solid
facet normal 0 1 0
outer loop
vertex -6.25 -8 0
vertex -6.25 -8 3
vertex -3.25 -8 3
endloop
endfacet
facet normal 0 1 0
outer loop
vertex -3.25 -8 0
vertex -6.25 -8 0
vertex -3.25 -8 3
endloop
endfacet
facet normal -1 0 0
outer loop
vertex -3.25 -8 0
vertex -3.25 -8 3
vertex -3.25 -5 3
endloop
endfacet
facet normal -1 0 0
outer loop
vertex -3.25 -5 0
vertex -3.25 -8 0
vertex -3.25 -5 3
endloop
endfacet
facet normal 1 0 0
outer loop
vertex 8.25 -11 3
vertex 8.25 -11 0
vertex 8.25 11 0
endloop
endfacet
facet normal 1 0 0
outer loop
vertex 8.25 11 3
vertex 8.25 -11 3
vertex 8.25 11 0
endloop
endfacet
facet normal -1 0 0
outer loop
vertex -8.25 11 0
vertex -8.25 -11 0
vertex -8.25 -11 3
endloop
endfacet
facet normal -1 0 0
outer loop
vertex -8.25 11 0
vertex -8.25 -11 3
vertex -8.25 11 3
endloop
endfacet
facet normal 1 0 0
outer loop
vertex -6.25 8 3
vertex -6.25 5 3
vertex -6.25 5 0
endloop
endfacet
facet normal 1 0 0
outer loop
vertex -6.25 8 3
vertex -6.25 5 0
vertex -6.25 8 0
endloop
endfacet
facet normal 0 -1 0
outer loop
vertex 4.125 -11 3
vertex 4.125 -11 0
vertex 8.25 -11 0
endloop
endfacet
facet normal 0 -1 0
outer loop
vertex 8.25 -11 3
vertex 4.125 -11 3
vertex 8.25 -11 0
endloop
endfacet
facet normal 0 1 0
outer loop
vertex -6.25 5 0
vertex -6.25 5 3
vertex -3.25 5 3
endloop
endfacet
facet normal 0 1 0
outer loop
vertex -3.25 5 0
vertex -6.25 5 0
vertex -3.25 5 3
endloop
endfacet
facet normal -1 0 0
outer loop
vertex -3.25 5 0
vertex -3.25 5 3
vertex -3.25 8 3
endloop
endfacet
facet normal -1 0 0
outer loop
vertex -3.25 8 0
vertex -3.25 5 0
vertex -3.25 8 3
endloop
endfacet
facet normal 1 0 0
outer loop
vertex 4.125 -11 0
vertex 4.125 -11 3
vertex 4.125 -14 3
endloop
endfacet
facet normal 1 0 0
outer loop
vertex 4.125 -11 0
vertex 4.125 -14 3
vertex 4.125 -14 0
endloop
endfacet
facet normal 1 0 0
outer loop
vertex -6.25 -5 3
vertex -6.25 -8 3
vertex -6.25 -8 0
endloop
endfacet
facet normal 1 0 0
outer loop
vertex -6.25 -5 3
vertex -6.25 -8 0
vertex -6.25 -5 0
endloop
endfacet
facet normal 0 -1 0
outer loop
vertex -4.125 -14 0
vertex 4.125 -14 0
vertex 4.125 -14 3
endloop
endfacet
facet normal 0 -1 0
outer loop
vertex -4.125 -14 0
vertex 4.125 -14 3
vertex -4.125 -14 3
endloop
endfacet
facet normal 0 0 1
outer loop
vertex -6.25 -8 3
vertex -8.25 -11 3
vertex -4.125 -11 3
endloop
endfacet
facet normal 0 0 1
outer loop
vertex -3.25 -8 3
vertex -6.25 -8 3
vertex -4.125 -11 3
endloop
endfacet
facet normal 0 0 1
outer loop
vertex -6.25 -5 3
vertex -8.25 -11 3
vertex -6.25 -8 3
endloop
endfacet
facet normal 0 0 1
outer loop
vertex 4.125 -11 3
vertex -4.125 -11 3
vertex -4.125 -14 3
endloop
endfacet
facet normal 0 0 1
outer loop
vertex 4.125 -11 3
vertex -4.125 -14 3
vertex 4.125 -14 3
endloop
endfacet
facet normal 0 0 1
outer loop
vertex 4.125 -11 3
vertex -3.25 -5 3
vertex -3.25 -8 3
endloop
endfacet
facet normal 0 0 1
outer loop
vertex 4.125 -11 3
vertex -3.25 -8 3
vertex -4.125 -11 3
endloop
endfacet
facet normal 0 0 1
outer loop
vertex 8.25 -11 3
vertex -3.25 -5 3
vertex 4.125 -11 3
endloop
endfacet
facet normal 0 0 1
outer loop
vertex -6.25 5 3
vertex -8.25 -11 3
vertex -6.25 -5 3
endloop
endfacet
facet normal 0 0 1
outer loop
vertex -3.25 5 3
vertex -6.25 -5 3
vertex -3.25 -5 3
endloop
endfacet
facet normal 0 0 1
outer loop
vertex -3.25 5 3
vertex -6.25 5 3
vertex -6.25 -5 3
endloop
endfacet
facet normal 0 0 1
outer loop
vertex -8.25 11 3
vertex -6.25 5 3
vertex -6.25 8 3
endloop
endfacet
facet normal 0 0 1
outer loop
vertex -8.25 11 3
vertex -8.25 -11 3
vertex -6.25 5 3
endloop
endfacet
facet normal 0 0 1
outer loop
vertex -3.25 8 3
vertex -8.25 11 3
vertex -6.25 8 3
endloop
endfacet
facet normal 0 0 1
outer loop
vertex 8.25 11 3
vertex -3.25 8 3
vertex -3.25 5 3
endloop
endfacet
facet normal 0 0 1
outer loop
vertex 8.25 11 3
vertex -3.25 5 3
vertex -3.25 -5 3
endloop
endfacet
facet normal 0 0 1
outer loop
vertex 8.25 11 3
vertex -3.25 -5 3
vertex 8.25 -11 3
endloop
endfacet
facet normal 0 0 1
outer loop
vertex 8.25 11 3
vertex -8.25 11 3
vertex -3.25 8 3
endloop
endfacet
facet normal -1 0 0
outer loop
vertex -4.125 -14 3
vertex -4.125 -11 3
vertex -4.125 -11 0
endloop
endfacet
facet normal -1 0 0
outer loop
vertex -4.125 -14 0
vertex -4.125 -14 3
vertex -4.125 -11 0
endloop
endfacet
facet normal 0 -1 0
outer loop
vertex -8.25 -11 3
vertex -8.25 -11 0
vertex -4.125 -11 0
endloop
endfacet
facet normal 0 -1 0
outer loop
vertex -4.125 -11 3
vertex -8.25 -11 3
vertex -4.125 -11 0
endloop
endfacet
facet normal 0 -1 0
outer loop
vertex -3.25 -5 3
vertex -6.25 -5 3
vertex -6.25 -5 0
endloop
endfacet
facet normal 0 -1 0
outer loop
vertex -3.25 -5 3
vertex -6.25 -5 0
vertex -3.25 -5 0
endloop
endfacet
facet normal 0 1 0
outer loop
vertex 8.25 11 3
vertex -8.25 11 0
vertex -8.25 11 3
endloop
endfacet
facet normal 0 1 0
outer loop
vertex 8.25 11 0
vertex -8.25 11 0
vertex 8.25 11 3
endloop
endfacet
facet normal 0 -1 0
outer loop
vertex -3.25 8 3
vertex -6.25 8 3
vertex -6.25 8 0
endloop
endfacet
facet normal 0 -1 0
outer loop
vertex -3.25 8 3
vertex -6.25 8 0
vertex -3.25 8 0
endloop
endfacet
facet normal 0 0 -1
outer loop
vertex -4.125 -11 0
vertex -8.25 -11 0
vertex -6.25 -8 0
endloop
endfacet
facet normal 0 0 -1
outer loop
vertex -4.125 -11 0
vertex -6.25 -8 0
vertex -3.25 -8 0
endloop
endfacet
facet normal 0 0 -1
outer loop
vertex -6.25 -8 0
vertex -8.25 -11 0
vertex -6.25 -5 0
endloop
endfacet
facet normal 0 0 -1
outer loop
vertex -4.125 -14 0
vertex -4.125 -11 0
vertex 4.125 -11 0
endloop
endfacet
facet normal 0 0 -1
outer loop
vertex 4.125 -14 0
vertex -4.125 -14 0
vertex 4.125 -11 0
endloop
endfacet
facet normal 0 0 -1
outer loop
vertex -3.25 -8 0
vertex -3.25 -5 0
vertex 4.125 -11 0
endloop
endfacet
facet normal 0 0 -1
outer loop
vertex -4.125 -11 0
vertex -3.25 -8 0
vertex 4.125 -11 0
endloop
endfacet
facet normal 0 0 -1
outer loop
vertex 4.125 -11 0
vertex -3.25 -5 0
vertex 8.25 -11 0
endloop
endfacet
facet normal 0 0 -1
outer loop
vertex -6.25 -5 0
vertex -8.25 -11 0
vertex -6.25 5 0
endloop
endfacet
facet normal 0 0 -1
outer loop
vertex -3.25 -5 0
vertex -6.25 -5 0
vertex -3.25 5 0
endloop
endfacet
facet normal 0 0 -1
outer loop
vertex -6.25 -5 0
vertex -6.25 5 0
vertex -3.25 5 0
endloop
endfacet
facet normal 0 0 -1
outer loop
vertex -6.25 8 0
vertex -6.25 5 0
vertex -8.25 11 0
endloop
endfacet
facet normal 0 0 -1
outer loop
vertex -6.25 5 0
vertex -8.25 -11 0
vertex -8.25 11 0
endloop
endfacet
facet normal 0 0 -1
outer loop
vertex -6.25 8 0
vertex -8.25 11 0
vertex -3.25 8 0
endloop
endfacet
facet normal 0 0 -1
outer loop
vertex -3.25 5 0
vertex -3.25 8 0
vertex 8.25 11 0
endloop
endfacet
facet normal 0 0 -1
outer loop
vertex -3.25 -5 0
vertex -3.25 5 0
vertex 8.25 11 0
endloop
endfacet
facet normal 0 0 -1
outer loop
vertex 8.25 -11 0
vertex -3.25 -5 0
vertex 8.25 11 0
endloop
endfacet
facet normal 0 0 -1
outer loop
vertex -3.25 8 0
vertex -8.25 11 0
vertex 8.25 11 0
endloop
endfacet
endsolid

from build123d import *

# Parameters (mm, degrees)
SKETCH1_W           = 16.5
SKETCH1_H           = 22
BOSS_EXTRUDE1_DEPTH = 3
SKETCH2_W           = 8.25
SKETCH2_H           = 3
BOSS_EXTRUDE2_DEPTH = 3
SKETCH3_W           = 3
SKETCH3_H           = 3
CUT_EXTRUDE1_DEPTH  = 3


with BuildPart() as part:
    # Sketch1 → Boss-Extrude1 (new body)
    with BuildSketch(Plane.XY):
        Rectangle(SKETCH1_W, SKETCH1_H)
    extrude(amount=BOSS_EXTRUDE1_DEPTH)

    # Sketch2 → Boss-Extrude2 (add)
    with BuildSketch(Plane(origin=(0, -11, 0), x_dir=(-1, 0, 0), z_dir=(0, -1, 0))):
        with Locations((0, -1.5)):
            Rectangle(SKETCH2_W, SKETCH2_H)
    extrude(amount=BOSS_EXTRUDE2_DEPTH)

    # Sketch3 → Cut-Extrude1 (cut)
    with BuildSketch(Plane.XY.offset(3)):
        with Locations((-4.75, -6.5)):
            Rectangle(SKETCH3_W, SKETCH3_H)
        with Locations((-4.75, 6.5)):
            Rectangle(SKETCH3_W, SKETCH3_H)
    extrude(amount=-CUT_EXTRUDE1_DEPTH, mode=Mode.SUBTRACT)


solid = part.part
